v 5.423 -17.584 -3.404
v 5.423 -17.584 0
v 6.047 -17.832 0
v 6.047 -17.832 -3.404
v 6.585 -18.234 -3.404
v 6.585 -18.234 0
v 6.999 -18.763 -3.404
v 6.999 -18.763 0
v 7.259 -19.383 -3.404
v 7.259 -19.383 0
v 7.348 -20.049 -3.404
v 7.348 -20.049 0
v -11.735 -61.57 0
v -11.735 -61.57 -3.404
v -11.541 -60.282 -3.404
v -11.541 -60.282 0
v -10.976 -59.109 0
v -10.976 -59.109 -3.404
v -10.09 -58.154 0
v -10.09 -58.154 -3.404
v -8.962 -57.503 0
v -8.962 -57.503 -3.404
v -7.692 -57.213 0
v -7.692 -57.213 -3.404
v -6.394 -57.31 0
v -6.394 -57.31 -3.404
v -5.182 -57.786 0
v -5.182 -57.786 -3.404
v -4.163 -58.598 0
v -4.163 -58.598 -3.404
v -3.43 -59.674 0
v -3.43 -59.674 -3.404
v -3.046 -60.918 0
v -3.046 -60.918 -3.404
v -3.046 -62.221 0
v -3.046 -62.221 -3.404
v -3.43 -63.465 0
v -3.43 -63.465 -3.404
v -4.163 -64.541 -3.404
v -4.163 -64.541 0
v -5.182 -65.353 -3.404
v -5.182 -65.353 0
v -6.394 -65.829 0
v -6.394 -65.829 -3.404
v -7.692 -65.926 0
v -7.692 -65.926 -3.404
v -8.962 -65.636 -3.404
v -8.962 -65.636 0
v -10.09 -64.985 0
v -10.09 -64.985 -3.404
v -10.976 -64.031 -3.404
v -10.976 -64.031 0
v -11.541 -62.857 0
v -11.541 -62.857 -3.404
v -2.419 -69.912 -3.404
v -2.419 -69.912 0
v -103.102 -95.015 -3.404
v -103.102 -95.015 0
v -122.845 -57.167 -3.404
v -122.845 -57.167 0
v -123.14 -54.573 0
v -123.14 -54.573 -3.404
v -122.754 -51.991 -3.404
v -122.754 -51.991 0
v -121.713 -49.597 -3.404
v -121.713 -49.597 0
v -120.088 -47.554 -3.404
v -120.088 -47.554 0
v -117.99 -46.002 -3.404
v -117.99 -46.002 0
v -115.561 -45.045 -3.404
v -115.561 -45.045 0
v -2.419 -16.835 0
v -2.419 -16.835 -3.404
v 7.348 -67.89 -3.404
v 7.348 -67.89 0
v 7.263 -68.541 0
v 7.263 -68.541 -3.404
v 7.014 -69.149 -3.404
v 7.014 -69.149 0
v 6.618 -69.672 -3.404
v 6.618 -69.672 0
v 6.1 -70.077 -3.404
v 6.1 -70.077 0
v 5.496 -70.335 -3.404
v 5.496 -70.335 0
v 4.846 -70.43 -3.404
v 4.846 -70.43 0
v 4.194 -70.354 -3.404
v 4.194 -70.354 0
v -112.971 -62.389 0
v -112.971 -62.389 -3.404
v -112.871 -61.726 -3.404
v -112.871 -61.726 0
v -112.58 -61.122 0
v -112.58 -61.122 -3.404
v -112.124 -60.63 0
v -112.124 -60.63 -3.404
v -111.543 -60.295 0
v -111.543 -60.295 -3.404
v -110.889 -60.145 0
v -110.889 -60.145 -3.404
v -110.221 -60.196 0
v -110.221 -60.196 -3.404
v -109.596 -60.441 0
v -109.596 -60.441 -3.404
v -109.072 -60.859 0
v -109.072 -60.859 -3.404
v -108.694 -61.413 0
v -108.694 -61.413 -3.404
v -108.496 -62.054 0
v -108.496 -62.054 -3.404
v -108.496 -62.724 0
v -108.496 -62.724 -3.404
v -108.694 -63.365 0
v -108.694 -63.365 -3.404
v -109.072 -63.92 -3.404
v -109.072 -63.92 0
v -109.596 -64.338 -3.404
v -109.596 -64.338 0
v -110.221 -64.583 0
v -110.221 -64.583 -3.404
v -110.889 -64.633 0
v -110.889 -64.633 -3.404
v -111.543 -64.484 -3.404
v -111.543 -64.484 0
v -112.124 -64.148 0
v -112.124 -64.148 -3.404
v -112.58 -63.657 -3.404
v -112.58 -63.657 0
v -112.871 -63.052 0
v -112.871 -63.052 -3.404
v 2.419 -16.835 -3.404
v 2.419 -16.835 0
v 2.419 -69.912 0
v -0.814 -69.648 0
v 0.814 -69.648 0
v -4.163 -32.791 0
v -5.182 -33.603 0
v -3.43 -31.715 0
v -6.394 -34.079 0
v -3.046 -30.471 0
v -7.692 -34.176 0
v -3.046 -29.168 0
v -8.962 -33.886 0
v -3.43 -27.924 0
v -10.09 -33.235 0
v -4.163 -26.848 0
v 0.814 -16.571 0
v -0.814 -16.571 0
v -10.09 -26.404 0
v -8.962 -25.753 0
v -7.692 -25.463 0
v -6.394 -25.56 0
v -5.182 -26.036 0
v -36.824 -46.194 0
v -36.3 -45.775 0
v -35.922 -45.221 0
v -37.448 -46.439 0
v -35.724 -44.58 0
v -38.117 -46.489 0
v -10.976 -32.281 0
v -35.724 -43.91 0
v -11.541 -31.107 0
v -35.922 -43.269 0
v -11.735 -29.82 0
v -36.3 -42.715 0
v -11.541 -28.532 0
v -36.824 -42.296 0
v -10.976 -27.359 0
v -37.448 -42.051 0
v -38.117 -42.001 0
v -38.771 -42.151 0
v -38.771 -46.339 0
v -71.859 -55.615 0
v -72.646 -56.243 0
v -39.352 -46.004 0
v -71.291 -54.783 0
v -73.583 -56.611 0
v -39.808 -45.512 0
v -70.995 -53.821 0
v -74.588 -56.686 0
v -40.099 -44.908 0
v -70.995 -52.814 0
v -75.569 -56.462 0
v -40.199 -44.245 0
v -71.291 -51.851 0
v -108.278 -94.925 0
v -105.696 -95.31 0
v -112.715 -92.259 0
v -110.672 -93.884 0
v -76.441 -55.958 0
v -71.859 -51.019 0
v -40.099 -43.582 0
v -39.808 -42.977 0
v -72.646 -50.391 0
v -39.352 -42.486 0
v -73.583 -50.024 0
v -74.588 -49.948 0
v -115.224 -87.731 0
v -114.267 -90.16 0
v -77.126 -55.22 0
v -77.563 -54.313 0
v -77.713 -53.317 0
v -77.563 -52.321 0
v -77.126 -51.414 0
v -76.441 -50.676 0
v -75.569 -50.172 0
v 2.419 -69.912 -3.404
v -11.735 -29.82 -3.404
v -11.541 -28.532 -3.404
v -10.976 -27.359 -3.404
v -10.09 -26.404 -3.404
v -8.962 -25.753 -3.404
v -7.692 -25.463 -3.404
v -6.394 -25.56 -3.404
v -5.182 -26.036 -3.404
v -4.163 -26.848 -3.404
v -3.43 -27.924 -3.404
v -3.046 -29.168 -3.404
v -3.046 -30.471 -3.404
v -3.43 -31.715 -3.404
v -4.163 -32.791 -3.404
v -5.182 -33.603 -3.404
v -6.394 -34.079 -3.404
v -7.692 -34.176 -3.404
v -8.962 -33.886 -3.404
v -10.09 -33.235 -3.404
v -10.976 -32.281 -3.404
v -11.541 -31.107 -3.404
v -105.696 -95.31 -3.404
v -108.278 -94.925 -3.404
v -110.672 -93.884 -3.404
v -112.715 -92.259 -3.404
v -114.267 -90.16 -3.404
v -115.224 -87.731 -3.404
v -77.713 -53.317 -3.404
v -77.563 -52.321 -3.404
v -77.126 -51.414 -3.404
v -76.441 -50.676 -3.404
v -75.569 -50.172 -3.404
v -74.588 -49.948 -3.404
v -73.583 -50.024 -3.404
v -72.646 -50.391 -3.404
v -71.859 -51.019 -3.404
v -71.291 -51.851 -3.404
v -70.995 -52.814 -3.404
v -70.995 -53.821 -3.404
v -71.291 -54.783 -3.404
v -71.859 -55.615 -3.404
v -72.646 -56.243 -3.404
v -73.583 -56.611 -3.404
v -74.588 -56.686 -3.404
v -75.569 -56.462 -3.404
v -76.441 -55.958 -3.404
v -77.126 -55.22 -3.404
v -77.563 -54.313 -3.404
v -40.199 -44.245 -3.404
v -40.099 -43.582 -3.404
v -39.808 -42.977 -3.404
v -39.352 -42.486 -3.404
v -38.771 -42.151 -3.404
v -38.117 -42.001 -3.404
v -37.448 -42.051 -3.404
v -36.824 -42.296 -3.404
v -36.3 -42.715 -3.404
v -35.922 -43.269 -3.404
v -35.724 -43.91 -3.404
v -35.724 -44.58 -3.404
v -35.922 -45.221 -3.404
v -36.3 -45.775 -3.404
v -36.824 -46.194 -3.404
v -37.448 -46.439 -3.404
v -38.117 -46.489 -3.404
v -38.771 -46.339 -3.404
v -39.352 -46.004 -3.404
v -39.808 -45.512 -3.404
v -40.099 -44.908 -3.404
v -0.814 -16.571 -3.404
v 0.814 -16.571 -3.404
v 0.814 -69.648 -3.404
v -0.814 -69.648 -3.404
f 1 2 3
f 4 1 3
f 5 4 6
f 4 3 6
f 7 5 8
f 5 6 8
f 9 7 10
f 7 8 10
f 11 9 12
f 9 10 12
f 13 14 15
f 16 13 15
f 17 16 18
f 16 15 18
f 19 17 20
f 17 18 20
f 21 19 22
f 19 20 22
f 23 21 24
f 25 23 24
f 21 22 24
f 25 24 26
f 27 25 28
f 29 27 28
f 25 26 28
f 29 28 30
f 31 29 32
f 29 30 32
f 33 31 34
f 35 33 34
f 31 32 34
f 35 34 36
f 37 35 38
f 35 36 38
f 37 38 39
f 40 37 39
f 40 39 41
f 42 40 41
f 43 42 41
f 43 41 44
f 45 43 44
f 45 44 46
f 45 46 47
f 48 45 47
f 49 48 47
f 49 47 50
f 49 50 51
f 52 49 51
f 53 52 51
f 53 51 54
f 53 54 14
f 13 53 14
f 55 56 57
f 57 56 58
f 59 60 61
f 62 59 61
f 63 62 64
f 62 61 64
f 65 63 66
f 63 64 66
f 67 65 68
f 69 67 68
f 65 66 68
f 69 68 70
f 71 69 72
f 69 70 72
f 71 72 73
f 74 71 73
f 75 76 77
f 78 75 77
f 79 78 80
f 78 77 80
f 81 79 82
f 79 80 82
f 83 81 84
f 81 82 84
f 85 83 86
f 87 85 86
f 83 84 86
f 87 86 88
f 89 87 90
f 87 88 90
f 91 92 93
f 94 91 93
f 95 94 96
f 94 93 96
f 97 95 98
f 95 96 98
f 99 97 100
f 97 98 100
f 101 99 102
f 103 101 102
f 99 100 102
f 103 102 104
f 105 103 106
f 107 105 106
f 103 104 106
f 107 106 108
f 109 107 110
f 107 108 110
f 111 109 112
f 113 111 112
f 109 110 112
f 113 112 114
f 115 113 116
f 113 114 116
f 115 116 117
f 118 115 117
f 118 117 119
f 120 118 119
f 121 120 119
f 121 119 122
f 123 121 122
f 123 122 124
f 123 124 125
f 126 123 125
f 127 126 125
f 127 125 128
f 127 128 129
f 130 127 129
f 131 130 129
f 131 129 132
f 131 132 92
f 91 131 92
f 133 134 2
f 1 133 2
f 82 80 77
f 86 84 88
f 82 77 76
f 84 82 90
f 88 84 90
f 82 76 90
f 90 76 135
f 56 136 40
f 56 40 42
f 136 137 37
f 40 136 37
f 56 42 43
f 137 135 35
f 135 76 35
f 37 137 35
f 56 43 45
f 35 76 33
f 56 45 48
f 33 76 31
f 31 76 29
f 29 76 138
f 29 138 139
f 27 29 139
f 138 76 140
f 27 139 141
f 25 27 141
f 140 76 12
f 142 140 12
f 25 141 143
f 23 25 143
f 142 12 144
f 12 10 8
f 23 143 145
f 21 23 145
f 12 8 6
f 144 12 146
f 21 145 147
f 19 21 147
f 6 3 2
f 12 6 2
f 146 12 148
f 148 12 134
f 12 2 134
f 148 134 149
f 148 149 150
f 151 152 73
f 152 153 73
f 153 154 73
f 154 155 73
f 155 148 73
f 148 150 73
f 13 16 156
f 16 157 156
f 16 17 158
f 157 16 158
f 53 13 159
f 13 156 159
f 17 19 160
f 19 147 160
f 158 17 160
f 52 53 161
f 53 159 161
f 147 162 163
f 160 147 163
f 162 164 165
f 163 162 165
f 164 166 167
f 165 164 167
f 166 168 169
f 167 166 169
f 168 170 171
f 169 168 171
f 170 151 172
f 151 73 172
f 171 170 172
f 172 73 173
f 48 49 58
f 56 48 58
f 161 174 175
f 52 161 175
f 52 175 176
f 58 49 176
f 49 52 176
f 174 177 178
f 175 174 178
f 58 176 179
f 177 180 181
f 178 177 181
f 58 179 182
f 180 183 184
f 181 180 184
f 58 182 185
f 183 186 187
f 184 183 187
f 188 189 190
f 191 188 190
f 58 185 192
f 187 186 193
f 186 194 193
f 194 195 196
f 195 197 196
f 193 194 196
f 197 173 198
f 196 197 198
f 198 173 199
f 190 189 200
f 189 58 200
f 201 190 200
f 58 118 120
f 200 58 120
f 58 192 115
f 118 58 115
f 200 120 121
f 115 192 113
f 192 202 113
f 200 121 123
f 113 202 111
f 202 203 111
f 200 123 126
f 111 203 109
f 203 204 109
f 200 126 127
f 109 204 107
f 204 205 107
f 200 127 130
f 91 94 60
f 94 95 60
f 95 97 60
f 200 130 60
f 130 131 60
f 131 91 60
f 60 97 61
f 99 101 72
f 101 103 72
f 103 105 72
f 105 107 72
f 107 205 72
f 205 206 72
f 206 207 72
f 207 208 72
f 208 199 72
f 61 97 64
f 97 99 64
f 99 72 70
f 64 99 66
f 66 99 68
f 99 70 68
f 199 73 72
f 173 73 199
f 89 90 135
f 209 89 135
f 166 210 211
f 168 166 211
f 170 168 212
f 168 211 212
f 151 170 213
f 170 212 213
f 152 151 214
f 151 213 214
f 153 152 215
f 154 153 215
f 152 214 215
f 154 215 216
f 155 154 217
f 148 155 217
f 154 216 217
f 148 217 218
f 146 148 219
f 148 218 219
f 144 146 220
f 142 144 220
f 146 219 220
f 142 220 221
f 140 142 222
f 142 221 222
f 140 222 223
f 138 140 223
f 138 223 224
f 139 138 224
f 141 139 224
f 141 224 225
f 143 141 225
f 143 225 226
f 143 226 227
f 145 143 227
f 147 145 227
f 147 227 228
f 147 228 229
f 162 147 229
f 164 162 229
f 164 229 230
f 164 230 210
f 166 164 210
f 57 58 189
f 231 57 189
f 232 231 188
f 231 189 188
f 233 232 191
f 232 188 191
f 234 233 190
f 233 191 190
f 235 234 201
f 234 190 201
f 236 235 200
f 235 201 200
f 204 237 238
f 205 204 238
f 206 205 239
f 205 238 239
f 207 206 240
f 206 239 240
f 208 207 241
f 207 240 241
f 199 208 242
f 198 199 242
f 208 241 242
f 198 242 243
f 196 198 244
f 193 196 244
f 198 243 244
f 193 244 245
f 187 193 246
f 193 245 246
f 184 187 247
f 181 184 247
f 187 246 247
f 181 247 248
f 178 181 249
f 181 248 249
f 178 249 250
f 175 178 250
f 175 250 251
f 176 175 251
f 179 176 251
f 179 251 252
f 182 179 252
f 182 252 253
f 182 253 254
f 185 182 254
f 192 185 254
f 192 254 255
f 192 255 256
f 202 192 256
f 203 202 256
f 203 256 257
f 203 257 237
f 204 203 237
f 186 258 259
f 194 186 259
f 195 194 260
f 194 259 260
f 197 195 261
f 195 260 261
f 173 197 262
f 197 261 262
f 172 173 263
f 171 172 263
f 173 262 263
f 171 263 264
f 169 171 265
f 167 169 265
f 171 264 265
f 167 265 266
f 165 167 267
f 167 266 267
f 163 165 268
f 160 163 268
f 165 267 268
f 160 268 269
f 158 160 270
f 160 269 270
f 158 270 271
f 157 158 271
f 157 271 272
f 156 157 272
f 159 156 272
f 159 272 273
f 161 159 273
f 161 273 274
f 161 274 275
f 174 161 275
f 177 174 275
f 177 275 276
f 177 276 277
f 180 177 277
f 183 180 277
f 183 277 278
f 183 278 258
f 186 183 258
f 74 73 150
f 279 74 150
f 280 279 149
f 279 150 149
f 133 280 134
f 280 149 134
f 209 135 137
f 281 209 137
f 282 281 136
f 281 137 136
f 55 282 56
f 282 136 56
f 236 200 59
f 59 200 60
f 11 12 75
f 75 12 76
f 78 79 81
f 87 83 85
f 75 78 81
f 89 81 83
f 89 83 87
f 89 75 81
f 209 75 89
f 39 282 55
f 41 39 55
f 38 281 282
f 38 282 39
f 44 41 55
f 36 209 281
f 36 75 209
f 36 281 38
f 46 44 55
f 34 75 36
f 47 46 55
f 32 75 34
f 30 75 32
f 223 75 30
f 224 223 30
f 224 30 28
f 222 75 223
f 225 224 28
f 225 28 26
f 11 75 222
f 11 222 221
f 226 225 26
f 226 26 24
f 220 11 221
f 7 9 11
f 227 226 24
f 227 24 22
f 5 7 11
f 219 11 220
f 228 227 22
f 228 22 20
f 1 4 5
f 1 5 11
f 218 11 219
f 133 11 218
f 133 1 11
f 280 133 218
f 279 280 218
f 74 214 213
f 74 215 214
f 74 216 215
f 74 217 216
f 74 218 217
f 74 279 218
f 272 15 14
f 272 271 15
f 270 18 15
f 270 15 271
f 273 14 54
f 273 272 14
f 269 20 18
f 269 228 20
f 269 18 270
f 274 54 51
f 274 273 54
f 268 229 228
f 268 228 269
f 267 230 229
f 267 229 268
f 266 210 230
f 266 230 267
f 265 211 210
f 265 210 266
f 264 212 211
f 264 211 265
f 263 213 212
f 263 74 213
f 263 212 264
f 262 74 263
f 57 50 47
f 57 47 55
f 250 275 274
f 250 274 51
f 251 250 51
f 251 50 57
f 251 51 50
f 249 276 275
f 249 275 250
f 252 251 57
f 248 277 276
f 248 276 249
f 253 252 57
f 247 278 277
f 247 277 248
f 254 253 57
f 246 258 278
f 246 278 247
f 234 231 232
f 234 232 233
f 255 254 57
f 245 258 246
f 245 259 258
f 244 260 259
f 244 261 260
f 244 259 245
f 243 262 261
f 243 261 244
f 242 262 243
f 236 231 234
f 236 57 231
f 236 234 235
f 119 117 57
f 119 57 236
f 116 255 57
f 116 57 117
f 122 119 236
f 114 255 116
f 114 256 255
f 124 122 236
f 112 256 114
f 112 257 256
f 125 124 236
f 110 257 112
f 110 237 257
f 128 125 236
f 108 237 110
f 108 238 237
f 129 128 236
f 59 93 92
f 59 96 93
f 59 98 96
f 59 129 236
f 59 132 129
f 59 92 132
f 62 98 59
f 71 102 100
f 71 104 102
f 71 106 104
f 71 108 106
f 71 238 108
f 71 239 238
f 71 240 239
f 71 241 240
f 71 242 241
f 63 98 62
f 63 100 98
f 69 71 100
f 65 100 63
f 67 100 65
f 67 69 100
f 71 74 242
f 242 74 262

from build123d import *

# Parameters (mm, degrees)
BOSS_EXTRUDE1_DEPTH             = 3.4036
F_1_4_CLEARANCE_HOLE1_D         = 6.7564
M4_CLEARANCE_HOLE1_D            = 4.5
HOLE_FOR_1_4_300_SC_NUTS_SP_1_D = 8.7376


with BuildPart() as part:
    # Sketch1 → Boss-Extrude1 (new body)
    with BuildSketch(Plane.XY):
        with BuildLine():
            Line((7.348321245, -20.048772414), (7.348321245, -67.889857088))
            ThreePointArc((7.348321245, -67.889857088), (6.372101393, -69.891404403), (4.193839631, -70.354408233))
            Line((4.193839631, -70.354408233), (2.419218956, -69.911945605))
            ThreePointArc((2.419218956, -69.911945605), (0, -69.614902867), (-2.419218956, -69.911945605))
            Line((-2.419218956, -69.911945605), (-103.101990119, -95.014979859))
            ThreePointArc((-103.101990119, -95.014979859), (-110.671589825, -93.883695604), (-115.224166338, -87.731241553))
            Line((-115.224166338, -87.731241553), (-122.84470605, -57.166926175))
            ThreePointArc((-122.84470605, -57.166926175), (-121.713421794, -49.59732647), (-115.560967743, -45.044749956))
            Line((-115.560967743, -45.044749956), (-2.419218956, -16.835343693))
            ThreePointArc((-2.419218956, -16.835343693), (0, -16.538300956), (2.419218956, -16.835343693))
            Line((2.419218956, -16.835343693), (5.42280286, -17.584221269))
            ThreePointArc((5.42280286, -17.584221269), (6.80986856, -18.484992267), (7.348321245, -20.048772414))
        make_face()
    extrude(amount=-BOSS_EXTRUDE1_DEPTH)

    # 1/4 Clearance Hole1 (through all)
    with Locations(Plane.XY):
        with Locations((-74.335136024, -53.317040996)):
            Hole(F_1_4_CLEARANCE_HOLE1_D / 2)

    # M4 Clearance Hole1 (through all)
    with Locations(Plane.XY):
        with Locations((-110.721225759, -62.389112081), (-37.949046288, -44.244969911)):
            Hole(M4_CLEARANCE_HOLE1_D / 2)

    # Hole for 1/4 300® SC Nuts (SP)1 (through all)
    with Locations(Plane.XY):
        with Locations((-7.366, -61.569560235), (-7.366, -29.819560235)):
            Hole(HOLE_FOR_1_4_300_SC_NUTS_SP_1_D / 2)


solid = part.part
